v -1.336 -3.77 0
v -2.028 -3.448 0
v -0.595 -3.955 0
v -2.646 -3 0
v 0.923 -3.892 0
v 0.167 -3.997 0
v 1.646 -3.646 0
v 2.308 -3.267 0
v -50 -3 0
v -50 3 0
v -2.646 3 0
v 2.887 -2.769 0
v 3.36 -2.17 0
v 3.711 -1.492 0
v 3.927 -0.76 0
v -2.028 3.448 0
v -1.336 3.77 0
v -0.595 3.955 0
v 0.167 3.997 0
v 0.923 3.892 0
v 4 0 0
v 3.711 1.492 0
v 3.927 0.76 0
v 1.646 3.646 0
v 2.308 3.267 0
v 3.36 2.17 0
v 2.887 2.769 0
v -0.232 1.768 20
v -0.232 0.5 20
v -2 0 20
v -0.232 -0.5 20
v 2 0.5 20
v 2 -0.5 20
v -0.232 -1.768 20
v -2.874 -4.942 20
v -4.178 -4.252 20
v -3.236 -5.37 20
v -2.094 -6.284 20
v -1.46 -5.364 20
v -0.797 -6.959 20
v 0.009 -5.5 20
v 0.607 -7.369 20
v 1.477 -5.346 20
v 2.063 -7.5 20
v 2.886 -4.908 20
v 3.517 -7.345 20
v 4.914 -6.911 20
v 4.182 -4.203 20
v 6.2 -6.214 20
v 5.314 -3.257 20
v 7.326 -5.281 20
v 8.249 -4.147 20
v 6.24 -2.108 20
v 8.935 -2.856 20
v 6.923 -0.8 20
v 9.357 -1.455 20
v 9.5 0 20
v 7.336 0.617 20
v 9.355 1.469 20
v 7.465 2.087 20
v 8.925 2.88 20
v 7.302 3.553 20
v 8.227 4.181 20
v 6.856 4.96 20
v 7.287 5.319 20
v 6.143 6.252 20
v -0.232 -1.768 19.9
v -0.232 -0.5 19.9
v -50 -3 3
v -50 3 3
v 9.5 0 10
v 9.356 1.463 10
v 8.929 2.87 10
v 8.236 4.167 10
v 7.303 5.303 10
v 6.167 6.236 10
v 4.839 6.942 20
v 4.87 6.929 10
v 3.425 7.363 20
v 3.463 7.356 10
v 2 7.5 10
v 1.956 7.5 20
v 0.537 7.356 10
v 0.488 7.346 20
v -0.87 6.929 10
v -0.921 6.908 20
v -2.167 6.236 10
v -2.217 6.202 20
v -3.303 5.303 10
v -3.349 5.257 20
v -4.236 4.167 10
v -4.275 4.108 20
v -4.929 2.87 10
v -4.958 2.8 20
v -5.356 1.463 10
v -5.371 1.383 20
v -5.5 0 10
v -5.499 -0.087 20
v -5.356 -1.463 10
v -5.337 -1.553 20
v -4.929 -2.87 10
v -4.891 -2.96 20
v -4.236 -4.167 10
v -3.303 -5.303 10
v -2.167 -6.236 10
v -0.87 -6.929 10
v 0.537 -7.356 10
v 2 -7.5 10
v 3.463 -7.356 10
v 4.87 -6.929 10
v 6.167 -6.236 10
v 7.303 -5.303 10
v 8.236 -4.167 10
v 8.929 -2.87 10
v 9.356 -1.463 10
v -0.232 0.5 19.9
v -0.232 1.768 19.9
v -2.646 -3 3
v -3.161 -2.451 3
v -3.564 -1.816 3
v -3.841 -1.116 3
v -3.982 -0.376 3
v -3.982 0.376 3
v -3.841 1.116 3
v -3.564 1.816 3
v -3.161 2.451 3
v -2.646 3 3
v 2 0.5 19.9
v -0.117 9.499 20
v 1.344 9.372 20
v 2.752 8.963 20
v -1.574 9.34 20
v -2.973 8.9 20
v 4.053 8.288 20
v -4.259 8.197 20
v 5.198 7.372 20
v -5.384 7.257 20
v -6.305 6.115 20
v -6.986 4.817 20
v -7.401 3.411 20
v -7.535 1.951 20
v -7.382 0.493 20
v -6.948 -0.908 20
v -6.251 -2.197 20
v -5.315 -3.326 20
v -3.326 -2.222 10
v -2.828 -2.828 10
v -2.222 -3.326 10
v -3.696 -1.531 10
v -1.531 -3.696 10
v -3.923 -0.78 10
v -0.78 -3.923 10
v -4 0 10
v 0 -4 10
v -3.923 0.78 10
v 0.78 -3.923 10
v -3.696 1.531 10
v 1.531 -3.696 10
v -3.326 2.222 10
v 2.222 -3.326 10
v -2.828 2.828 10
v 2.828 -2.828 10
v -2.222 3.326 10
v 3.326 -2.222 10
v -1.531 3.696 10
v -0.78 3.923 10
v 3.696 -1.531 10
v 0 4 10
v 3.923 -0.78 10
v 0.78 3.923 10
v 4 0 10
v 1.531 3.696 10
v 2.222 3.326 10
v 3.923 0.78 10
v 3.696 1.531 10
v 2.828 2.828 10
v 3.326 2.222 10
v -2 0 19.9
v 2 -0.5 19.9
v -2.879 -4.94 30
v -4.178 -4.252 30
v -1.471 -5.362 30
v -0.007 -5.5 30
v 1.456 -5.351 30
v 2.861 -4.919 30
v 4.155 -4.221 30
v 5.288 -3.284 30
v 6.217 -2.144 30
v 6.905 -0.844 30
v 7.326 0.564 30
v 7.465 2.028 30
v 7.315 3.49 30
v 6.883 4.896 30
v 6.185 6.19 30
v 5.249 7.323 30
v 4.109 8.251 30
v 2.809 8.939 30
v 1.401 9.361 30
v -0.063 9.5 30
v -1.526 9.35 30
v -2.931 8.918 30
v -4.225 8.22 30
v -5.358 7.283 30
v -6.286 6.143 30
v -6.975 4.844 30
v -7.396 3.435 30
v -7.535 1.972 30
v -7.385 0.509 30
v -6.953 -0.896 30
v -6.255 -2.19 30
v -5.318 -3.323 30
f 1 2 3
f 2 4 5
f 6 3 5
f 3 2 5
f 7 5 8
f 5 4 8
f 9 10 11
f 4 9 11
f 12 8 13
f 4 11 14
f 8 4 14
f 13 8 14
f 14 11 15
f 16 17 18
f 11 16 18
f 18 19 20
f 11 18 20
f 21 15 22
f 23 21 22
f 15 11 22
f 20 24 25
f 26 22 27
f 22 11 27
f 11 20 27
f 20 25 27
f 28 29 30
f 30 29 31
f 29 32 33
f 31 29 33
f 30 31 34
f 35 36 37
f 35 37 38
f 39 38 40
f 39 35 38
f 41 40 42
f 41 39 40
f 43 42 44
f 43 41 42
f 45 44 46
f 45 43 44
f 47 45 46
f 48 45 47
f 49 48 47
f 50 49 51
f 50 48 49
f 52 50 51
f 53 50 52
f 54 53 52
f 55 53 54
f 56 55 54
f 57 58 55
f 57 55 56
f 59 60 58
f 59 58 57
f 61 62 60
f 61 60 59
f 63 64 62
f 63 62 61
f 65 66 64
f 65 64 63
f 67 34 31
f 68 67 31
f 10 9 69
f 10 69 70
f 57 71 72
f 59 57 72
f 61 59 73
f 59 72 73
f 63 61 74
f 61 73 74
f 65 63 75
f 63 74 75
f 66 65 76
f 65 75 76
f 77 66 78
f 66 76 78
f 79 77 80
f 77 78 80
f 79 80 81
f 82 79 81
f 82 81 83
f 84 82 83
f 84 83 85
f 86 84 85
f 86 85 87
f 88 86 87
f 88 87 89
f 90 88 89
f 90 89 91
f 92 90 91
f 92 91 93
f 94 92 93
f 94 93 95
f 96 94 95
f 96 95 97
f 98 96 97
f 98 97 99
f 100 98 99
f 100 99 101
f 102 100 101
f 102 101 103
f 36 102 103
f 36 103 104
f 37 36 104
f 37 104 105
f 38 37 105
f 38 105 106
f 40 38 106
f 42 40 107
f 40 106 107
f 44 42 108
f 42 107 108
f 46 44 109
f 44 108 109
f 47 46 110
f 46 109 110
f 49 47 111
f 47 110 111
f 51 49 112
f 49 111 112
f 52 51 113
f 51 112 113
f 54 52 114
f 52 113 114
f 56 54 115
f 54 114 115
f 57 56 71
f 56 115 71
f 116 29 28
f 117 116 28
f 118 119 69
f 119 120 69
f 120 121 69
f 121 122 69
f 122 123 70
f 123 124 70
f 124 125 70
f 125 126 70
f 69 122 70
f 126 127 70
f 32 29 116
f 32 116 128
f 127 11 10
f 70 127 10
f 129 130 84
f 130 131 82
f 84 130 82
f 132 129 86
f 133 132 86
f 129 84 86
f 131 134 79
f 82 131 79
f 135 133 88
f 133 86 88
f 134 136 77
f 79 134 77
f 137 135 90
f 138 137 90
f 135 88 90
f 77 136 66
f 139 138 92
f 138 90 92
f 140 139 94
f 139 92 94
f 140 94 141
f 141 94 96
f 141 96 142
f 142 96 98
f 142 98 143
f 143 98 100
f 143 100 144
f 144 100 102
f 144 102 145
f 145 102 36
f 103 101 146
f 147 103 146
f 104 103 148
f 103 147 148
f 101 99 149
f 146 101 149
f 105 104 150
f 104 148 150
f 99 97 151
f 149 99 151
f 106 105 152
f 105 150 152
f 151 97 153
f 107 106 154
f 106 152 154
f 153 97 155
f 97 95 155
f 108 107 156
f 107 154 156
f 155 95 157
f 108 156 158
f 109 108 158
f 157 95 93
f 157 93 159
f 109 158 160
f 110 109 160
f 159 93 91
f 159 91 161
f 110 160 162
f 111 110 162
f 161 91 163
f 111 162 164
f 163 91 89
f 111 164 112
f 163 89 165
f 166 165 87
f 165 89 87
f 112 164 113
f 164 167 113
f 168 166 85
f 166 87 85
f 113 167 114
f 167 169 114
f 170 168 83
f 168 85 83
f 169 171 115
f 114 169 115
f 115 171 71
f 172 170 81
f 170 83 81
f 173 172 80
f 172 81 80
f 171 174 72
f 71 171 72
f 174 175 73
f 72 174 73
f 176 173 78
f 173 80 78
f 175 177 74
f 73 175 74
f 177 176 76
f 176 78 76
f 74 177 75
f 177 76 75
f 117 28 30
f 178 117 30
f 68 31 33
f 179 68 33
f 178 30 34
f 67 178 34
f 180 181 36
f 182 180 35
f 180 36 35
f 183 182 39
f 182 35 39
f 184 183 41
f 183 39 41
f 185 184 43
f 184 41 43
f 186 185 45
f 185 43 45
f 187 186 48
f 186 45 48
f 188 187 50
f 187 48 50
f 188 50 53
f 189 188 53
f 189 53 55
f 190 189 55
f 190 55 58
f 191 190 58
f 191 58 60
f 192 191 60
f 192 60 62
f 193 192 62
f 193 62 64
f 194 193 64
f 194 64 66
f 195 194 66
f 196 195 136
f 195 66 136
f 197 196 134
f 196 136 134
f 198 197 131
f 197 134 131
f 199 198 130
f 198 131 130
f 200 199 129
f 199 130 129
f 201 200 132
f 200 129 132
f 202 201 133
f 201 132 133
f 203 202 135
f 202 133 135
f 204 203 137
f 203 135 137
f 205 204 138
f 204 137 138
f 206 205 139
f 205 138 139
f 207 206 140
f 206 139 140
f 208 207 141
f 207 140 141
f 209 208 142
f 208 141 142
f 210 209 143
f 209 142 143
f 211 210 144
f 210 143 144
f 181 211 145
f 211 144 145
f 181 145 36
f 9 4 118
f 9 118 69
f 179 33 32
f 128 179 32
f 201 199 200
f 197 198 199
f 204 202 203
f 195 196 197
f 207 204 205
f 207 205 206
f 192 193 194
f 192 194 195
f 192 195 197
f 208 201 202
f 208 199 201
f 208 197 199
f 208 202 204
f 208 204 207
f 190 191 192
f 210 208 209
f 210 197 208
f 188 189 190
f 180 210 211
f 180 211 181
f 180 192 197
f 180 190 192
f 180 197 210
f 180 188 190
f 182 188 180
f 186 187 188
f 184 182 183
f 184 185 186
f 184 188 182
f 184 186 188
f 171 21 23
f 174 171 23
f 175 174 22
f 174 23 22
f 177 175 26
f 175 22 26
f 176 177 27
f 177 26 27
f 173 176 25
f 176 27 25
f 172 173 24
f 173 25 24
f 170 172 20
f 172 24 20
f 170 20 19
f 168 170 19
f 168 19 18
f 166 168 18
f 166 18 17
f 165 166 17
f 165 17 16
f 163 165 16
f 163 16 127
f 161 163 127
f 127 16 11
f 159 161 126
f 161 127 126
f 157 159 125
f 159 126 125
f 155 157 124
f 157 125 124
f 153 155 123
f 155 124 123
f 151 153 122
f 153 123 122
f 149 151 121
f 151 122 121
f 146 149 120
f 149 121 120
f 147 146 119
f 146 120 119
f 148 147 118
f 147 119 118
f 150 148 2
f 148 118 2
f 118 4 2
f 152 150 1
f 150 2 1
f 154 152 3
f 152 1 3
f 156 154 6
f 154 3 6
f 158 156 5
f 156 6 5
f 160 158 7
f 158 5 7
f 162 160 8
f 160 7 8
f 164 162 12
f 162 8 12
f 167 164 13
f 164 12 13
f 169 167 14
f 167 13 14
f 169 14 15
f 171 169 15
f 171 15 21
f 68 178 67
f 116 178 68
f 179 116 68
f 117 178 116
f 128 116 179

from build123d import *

# Parameters (mm, degrees)
SKETCH1_R           = 4
BOSS_EXTRUDE1_DEPTH = 10
SKETCH2_R           = 7.5
BOSS_EXTRUDE2_DEPTH = 10
SKETCH3_W           = 2.232233047
SKETCH3_H           = 0.5
CUT_EXTRUDE1_DEPTH  = 0.1
SKETCH6_R           = 7.5
BOSS_EXTRUDE5_DEPTH = 10
SKETCH7_W           = 50
SKETCH7_H           = 6
BOSS_EXTRUDE6_DEPTH = 3


with BuildPart() as part:
    # Sketch1 → Boss-Extrude1 (new body)
    with BuildSketch(Plane.XY):
        Circle(SKETCH1_R)
    extrude(amount=BOSS_EXTRUDE1_DEPTH)

    # Sketch2 → Boss-Extrude2 (add)
    with BuildSketch(Plane.XY.offset(10)):
        with Locations((2, 0)):
            Circle(SKETCH2_R)
    extrude(amount=BOSS_EXTRUDE2_DEPTH)

    # Sketch3 → Cut-Extrude1 (cut)
    with BuildSketch(Plane.XY.offset(20)):
        Polygon((-1.5, 0.5), (-0.232233047, 0.5), (-0.232233047, 1.767766953), align=None)
        Polygon((-2, 0), (-0.232233047, 0), (-0.232233047, 0.5), (-1.5, 0.5), align=None)
        Polygon((-0.232233047, -0.5), (-0.232233047, 0), (-2, 0), (-1.5, -0.5), align=None)
        Polygon((-0.232233047, -1.767766953), (-0.232233047, -0.5), (-1.5, -0.5), align=None)
        with Locations((0.883883476, 0.25)):
            Rectangle(SKETCH3_W, SKETCH3_H)
        with Locations((0.883883476, -0.25)):
            Rectangle(SKETCH3_W, SKETCH3_H)
    extrude(amount=-CUT_EXTRUDE1_DEPTH, mode=Mode.SUBTRACT)

    # Sketch6 → Boss-Extrude5 (add)
    with BuildSketch(Plane.XY.offset(20)):
        with Locations(Location((-0.034904813, 1.99969539, 0), (0, 0, 236.464463187))):
            Circle(SKETCH6_R)
    extrude(amount=BOSS_EXTRUDE5_DEPTH)

    # Sketch7 → Boss-Extrude6 (add)
    with BuildSketch(Plane(origin=(0, 0, 0), x_dir=(-1, 0, 0), z_dir=(0, 0, -1))):
        with Locations((25, 0)):
            Rectangle(SKETCH7_W, SKETCH7_H)
    extrude(amount=-BOSS_EXTRUDE6_DEPTH)


solid = part.part
